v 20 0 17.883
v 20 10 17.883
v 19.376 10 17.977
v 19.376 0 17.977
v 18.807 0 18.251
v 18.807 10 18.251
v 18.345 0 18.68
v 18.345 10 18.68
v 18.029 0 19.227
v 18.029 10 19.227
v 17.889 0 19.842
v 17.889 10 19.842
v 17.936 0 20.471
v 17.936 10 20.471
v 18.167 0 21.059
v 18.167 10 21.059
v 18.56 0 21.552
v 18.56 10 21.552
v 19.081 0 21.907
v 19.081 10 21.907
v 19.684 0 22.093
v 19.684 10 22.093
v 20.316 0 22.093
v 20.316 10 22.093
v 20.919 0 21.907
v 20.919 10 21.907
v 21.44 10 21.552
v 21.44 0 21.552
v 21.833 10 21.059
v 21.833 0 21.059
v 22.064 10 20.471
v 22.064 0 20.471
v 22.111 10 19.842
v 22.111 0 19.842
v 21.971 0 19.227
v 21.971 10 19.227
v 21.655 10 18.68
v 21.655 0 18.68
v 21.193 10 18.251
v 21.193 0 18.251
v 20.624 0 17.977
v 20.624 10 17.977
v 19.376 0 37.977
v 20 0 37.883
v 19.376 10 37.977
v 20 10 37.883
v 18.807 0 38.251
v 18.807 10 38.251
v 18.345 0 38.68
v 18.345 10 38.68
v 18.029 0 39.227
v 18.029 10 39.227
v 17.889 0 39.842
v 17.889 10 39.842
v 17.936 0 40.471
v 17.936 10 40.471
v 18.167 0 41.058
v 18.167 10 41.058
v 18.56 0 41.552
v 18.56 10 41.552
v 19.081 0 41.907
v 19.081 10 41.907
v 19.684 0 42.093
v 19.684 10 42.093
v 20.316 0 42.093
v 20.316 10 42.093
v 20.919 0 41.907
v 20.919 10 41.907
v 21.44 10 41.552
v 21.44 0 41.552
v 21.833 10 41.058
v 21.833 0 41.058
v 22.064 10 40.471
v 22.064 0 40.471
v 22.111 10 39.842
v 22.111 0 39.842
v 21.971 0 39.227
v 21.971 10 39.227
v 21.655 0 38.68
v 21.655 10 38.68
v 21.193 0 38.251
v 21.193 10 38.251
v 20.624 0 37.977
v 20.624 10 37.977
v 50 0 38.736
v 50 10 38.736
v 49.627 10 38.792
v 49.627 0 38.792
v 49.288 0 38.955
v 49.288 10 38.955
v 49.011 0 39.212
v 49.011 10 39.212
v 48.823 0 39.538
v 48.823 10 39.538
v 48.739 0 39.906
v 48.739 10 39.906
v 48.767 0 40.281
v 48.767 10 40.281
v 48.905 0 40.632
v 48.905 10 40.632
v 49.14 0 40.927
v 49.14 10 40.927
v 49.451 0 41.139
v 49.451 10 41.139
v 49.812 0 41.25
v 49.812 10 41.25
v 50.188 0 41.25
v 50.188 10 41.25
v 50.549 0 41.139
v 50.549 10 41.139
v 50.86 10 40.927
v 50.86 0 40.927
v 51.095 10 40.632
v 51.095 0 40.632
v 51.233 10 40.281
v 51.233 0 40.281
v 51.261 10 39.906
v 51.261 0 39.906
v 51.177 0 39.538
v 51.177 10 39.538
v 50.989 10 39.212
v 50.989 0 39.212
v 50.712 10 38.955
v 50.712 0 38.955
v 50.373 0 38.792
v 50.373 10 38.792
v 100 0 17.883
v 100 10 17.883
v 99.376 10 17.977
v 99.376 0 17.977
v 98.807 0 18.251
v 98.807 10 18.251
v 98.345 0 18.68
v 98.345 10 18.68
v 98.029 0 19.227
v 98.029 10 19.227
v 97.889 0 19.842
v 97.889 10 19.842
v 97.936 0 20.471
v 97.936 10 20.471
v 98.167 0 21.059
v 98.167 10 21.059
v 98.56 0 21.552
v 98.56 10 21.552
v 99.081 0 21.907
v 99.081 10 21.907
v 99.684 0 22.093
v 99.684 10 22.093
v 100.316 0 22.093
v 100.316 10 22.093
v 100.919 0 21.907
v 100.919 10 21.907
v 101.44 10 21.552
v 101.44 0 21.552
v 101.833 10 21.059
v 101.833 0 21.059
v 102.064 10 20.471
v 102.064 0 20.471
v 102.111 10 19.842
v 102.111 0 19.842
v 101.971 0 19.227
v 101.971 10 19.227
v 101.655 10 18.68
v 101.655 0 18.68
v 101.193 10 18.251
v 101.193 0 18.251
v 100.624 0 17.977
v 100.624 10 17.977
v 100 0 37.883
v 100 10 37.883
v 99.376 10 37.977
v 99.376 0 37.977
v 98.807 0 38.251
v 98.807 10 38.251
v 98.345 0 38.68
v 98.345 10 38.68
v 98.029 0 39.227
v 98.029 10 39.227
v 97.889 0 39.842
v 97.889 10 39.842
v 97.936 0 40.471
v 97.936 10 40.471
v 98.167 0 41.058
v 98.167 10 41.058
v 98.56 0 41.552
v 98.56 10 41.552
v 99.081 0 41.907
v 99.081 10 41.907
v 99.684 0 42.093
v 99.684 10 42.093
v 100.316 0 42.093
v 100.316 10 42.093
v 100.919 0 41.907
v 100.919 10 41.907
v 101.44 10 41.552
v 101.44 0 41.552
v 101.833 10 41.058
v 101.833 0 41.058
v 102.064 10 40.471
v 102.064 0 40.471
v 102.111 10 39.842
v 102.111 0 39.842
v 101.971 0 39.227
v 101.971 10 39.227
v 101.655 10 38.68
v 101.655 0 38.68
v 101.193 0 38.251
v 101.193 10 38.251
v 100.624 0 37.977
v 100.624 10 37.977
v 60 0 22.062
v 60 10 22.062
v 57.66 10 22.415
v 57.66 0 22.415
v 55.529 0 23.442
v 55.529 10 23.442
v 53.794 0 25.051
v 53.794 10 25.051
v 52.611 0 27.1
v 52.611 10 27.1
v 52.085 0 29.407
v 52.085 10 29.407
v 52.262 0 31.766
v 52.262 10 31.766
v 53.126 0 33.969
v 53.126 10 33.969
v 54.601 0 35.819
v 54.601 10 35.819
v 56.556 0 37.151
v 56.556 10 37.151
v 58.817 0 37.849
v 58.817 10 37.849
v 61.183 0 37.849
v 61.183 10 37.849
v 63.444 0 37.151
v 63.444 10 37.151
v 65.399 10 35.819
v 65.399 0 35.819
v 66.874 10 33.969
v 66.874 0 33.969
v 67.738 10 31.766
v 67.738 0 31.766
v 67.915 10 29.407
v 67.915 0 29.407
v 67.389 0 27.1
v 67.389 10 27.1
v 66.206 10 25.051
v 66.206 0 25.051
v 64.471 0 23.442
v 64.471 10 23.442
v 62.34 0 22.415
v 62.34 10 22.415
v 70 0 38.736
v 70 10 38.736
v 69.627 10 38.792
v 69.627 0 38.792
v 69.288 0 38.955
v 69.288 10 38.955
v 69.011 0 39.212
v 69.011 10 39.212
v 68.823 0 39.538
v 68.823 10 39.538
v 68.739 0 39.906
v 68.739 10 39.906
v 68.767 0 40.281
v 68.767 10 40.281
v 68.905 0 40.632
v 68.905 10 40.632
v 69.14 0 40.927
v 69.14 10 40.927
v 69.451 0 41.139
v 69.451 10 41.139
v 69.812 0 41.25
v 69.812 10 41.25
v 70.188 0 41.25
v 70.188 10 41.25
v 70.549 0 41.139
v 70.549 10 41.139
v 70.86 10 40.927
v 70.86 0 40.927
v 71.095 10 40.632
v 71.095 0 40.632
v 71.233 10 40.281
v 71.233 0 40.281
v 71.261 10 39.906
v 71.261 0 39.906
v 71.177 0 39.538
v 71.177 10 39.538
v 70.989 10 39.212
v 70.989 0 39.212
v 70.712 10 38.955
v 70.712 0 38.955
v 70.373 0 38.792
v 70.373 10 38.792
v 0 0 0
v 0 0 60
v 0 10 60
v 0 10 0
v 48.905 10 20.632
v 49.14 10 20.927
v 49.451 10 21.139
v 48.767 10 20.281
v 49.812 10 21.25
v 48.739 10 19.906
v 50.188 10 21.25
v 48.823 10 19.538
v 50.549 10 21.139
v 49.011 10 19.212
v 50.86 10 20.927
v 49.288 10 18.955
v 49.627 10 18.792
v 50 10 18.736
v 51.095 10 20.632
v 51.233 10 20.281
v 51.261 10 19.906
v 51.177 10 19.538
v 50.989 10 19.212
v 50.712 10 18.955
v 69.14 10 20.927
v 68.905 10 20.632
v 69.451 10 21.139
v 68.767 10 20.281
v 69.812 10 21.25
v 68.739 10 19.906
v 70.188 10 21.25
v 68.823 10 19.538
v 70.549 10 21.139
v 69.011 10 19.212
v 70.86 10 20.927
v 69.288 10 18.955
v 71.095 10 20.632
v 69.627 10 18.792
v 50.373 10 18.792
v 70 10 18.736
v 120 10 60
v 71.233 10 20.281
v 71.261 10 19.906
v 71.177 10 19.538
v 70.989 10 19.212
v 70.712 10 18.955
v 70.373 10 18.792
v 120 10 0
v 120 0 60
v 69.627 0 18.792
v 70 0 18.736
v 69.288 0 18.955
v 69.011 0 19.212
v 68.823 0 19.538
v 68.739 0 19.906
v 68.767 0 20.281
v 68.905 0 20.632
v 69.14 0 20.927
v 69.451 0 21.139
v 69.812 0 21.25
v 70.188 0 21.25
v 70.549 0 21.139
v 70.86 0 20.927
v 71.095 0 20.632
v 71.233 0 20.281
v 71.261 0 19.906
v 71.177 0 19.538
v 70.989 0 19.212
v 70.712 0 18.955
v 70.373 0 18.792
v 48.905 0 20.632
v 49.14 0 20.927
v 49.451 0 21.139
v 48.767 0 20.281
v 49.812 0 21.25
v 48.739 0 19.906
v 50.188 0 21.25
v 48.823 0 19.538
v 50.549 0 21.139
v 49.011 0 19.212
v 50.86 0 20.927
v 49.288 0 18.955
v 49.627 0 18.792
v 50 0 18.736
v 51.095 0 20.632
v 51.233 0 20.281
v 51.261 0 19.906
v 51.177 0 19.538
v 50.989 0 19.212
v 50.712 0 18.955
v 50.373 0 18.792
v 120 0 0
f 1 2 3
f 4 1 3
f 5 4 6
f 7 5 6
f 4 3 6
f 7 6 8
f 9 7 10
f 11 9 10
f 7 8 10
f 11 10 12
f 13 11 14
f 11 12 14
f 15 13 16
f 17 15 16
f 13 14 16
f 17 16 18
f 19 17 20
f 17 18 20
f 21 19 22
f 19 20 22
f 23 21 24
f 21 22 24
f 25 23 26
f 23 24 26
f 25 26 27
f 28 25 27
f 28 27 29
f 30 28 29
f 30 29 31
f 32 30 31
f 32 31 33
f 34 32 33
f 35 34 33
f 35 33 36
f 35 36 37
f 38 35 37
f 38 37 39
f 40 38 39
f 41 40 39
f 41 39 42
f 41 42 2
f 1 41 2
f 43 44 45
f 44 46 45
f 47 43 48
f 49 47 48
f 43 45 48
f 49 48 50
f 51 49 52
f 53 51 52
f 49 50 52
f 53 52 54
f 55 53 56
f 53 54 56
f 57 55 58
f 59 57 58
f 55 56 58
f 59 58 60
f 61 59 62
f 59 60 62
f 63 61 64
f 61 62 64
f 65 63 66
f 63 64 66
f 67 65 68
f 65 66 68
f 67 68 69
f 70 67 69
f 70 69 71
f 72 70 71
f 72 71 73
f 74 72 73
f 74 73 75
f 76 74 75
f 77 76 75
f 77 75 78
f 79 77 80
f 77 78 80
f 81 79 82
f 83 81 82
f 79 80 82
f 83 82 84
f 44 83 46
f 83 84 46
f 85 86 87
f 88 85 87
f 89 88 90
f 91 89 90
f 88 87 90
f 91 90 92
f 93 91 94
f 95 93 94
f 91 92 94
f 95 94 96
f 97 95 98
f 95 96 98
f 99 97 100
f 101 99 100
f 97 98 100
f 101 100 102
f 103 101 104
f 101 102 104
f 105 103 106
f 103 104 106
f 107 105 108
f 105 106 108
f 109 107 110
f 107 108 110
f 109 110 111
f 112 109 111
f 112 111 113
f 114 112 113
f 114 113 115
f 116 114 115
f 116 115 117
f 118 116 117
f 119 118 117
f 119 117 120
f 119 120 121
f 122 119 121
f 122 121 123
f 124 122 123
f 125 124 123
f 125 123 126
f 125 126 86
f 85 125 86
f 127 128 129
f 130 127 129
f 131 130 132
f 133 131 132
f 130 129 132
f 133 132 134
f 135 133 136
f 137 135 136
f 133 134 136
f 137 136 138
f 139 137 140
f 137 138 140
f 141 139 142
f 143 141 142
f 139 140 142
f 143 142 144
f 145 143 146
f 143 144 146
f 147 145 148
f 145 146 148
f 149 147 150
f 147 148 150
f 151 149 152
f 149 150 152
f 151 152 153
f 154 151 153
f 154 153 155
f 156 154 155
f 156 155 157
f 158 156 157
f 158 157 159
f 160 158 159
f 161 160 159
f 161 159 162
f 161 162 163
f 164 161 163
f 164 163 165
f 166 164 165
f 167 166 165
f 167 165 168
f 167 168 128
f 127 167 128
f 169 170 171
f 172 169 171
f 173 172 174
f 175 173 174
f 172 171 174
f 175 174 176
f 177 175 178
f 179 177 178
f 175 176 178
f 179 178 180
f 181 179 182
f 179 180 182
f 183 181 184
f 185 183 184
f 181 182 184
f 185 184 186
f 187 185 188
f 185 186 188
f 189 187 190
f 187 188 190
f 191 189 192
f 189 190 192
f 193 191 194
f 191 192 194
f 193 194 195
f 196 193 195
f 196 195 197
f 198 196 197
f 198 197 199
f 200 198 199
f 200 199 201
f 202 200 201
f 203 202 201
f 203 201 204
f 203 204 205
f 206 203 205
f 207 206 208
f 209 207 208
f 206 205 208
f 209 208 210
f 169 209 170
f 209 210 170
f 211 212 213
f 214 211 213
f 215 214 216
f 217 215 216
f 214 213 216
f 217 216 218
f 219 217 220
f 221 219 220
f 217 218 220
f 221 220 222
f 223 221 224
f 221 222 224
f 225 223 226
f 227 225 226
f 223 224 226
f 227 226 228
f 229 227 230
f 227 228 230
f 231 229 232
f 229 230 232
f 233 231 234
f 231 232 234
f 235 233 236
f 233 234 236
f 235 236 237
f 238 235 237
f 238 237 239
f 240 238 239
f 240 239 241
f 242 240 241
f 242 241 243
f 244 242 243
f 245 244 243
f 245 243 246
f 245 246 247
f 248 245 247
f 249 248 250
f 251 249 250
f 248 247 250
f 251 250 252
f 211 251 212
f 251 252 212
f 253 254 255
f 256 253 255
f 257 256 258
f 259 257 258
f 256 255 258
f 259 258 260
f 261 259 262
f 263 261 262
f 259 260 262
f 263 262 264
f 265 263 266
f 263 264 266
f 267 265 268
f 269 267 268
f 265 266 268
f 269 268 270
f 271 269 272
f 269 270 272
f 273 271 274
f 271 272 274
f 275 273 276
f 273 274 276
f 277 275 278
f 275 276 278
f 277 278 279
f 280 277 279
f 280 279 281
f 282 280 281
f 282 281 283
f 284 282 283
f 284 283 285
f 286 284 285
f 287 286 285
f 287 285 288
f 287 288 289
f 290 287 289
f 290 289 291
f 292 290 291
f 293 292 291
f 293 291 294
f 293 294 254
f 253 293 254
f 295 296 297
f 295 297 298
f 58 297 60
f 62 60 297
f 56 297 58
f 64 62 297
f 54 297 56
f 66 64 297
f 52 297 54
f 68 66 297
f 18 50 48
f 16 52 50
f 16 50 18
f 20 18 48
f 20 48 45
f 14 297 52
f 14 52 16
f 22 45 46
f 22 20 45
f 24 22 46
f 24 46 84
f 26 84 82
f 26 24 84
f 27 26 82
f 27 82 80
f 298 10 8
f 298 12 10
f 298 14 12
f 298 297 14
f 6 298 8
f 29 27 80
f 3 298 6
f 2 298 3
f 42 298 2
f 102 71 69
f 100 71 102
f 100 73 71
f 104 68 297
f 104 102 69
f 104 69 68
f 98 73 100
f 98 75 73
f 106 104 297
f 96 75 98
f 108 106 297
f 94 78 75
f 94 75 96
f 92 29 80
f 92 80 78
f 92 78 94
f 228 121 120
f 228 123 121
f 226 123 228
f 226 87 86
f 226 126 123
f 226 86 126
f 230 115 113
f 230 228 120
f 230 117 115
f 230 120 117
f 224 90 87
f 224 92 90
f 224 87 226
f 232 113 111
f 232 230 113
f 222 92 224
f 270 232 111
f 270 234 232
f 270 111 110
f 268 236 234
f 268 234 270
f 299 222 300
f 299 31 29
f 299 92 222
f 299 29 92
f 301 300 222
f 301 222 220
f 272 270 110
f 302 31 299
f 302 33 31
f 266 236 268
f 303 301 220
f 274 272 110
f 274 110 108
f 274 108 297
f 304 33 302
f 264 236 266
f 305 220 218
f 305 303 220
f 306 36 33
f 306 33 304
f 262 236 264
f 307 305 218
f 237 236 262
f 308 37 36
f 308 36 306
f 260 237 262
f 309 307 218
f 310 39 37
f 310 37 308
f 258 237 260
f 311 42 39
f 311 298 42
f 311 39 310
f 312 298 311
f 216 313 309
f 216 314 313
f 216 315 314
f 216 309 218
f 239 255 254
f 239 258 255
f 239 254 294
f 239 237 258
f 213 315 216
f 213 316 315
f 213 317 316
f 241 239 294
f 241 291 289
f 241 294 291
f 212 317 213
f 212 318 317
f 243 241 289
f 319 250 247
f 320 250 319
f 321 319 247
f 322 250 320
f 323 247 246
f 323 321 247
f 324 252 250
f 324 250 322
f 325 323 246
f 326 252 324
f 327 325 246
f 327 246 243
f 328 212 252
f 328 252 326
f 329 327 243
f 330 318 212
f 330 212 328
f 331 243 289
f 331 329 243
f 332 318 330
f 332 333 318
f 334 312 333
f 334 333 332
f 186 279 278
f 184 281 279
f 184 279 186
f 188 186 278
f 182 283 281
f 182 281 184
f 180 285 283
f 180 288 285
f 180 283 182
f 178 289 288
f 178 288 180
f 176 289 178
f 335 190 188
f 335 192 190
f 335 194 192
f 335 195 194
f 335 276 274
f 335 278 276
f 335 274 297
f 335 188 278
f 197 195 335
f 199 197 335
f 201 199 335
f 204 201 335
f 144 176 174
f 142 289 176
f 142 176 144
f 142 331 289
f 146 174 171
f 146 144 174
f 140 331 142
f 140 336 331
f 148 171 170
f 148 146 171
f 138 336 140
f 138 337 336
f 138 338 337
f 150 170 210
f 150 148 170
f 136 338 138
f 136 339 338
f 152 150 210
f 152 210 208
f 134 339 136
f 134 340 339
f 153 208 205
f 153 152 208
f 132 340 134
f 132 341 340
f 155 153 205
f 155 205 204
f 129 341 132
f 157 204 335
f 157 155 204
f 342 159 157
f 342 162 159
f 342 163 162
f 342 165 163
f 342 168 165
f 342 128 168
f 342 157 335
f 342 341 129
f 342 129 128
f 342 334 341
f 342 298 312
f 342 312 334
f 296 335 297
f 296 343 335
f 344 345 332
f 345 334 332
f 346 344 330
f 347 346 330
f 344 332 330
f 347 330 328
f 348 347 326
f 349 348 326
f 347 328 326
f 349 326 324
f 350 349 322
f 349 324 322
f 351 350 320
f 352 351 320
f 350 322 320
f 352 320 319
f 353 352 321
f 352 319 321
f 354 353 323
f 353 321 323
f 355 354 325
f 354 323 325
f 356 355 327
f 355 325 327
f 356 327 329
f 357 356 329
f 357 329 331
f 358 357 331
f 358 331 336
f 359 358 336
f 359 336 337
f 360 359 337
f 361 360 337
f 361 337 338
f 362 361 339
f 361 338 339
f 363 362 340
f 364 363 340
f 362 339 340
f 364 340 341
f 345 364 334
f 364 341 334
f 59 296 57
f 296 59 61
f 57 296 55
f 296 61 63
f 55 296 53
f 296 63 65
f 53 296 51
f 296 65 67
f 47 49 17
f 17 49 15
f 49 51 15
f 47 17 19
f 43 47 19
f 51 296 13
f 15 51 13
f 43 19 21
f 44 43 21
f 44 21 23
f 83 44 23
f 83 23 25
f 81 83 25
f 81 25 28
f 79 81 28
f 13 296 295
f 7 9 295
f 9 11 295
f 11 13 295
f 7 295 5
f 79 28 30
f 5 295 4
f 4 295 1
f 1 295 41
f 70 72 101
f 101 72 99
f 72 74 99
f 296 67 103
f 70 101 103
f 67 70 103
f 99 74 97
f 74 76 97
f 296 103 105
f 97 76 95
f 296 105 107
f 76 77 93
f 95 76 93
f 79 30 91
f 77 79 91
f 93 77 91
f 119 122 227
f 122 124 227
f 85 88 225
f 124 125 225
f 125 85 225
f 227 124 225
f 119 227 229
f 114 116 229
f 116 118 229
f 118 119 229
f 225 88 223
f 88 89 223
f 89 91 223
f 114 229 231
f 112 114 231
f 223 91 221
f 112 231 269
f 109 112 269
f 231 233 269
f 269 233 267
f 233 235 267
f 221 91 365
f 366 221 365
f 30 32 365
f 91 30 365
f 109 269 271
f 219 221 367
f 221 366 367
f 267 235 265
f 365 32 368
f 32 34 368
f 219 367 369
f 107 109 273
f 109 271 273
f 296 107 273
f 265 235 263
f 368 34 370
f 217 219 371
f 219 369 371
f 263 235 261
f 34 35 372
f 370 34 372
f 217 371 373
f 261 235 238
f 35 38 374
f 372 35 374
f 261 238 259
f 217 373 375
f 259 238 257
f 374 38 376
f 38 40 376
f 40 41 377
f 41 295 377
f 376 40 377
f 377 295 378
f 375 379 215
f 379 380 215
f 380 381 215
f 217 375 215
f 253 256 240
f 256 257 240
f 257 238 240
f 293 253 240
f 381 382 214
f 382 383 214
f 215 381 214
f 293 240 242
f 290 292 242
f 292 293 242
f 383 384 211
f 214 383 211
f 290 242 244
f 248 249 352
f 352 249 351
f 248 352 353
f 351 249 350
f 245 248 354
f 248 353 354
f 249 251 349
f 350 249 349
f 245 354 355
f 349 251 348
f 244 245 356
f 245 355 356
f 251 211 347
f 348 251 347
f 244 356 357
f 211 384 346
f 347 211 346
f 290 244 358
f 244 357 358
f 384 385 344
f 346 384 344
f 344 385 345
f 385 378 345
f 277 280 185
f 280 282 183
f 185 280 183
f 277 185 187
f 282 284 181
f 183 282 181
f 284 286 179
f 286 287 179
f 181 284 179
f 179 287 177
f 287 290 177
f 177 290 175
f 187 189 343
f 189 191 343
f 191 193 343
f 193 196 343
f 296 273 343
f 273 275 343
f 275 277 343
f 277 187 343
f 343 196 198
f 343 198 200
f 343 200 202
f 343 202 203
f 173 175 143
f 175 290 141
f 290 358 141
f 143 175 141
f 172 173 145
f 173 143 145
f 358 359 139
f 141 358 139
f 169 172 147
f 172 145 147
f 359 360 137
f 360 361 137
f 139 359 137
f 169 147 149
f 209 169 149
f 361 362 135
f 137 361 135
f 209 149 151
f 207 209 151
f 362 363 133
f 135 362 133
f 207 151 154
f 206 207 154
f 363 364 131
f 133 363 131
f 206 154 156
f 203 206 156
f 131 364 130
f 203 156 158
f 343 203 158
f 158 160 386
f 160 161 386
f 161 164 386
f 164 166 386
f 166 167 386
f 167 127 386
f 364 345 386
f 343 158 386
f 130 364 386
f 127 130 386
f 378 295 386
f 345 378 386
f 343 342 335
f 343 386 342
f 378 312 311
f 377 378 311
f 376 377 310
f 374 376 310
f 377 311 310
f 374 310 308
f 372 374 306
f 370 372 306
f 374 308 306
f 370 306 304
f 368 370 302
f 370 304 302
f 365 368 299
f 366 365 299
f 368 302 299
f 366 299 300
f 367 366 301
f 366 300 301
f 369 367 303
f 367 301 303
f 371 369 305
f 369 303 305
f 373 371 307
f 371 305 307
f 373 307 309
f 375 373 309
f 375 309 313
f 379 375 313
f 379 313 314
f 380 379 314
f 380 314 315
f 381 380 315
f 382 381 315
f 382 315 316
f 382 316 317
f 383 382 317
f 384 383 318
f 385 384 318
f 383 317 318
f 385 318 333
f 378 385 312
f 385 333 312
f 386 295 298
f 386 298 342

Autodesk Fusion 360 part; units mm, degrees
sketch "Sketch1" plane through (0, 0, 0) normal (0, 1, 0) x (1, 0, 0)
  line L0 (0, 0) -> (120, 0)
  line L1 (120, 0) -> (120, -60)
  line L2 (120, -60) -> (0, -60)
  line L3 (0, -60) -> (0, 0)
  dimension "d1" = 120
  dimension "d2" = 60
extrude "Extrude1" add sketch "Sketch1" along normal blind 10
sketch "Sketch2" plane through (0, 0, 0) normal (0, -1, 0) x (1, 0, 0)
  line L0 (120, 60) -> (0, 60)
  line L1 (0, 60) -> (0, 0)
  line L2 (0, 0) -> (120, 0)
  line L3 (120, 0) -> (120, 60)
  line L4 (75.5, 45.5) -> (44.5, 45.5)
  line L5 (44.5, 45.5) -> (44.5, 14.5)
  line L6 (44.5, 14.5) -> (75.5, 14.5)
  dimension "d8" = 31
  dimension "d9" = 31
  dimension "d10" = 31
sketch "Sketch3" plane through (0, 0, 0) normal (0, -1, 0) x (1, 0, 0)
  circle A0 centre (44.5, 14.5) radius 1.2645
  circle A1 centre (75.5, 45.5) radius 1.2645
  circle A2 centre (75.5, 14.5) radius 1.2645
  circle A3 centre (44.5, 45.5) radius 1.2645
  line L0 (120, 60) -> (0, 60)
  line L1 (0, 60) -> (0, 0)
  line L2 (0, 0) -> (120, 0)
  line L3 (120, 0) -> (120, 60)
  line L4 (60, 60) -> (60, 30)
  line L5 (120, 60) -> (0, 60)
  line L6 (0, 60) -> (0, 0)
  line L7 (0, 0) -> (120, 0)
  line L8 (120, 0) -> (120, 60)
  dimension "d20" = 30
sketch "Sketch4" plane through (0, 0, 0) normal (0, -1, 0) x (1, 0, 0)
  line L0 (120, 60) -> (0, 60)
  line L1 (0, 60) -> (0, 0)
  line L2 (0, 0) -> (120, 0)
  line L3 (120, 0) -> (120, 60)
sketch "Sketch6" plane through (0, 0, 0) normal (0, -1, 0) x (1, 0, 0)
sketch "Sketch7" plane through (0, 0, 0) normal (0, -1, 0) x (1, 0, 0)
  line L0 (0, 0) -> (60, 0)
  line L1 (60, 0) -> (60, 30)
  line L2 (60, 30) -> (100, 30)
  line L3 (60, 30) -> (20, 30)
  line L4 (20, 30) -> (20, 20)
  line L5 (20, 30) -> (20, 40)
  line L6 (100, 30) -> (100, 20)
  line L7 (100, 30) -> (100, 40)
  dimension "d21" = 60
  dimension "d22" = 30
  dimension "d23" = 40
  dimension "d24" = 40
  dimension "d25" = 10
  dimension "d26" = 10
  dimension "d27" = 10
  dimension "d28" = 10
hole "Hole3" at (60, 0, 30) direction (0, 1, 0) diameter 15.875 depth 25 tip angle 118
sketch "Sketch8" plane through (0, 0, 0) normal (0, -1, 0) x (1, 0, 0)
  line L0 (0, 0) -> (60, 0)
  line L1 (60, 0) -> (60, 30)
  line L2 (60, 30) -> (100, 30)
  line L3 (100, 30) -> (100, 40)
  line L4 (100, 30) -> (100, 20)
  line L5 (100, 40) -> (20, 40)
  line L6 (60, 30) -> (20, 30)
  line L7 (20, 40) -> (20, 20)
  dimension "d32" = 60
  dimension "d33" = 30
  dimension "d34" = 40
  dimension "d35" = 10
  dimension "d36" = 10
  dimension "d37" = 80
  dimension "d38" = 40
  dimension "d39" = 20
hole "Hole4" at (20, 0, 40) at (100, 0, 40) at (100, 0, 20) at (20, 0, 20) direction (0, 1, 0) diameter 4.234 depth 25 tip angle 118
sketch "Sketch9" plane through (0, 0, 0) normal (0, -1, 0) x (1, 0, 0)
  line L0 (70, 40) -> (50, 40)
  line L1 (50, 40) -> (50, 20)
  line L2 (50, 20) -> (70, 20)
  dimension "d47" = 20
  dimension "d48" = 20
  dimension "d49" = 20
hole "Hole5" at (70, 0, 40) at (70, 0, 20) at (50, 0, 40) at (50, 0, 20) direction (0, 1, 0) diameter 2.529 depth 90 tip angle 118
sketch "Sketch5" plane through (0, 0, 0) normal (0, -1, 0) x (1, 0, 0)
